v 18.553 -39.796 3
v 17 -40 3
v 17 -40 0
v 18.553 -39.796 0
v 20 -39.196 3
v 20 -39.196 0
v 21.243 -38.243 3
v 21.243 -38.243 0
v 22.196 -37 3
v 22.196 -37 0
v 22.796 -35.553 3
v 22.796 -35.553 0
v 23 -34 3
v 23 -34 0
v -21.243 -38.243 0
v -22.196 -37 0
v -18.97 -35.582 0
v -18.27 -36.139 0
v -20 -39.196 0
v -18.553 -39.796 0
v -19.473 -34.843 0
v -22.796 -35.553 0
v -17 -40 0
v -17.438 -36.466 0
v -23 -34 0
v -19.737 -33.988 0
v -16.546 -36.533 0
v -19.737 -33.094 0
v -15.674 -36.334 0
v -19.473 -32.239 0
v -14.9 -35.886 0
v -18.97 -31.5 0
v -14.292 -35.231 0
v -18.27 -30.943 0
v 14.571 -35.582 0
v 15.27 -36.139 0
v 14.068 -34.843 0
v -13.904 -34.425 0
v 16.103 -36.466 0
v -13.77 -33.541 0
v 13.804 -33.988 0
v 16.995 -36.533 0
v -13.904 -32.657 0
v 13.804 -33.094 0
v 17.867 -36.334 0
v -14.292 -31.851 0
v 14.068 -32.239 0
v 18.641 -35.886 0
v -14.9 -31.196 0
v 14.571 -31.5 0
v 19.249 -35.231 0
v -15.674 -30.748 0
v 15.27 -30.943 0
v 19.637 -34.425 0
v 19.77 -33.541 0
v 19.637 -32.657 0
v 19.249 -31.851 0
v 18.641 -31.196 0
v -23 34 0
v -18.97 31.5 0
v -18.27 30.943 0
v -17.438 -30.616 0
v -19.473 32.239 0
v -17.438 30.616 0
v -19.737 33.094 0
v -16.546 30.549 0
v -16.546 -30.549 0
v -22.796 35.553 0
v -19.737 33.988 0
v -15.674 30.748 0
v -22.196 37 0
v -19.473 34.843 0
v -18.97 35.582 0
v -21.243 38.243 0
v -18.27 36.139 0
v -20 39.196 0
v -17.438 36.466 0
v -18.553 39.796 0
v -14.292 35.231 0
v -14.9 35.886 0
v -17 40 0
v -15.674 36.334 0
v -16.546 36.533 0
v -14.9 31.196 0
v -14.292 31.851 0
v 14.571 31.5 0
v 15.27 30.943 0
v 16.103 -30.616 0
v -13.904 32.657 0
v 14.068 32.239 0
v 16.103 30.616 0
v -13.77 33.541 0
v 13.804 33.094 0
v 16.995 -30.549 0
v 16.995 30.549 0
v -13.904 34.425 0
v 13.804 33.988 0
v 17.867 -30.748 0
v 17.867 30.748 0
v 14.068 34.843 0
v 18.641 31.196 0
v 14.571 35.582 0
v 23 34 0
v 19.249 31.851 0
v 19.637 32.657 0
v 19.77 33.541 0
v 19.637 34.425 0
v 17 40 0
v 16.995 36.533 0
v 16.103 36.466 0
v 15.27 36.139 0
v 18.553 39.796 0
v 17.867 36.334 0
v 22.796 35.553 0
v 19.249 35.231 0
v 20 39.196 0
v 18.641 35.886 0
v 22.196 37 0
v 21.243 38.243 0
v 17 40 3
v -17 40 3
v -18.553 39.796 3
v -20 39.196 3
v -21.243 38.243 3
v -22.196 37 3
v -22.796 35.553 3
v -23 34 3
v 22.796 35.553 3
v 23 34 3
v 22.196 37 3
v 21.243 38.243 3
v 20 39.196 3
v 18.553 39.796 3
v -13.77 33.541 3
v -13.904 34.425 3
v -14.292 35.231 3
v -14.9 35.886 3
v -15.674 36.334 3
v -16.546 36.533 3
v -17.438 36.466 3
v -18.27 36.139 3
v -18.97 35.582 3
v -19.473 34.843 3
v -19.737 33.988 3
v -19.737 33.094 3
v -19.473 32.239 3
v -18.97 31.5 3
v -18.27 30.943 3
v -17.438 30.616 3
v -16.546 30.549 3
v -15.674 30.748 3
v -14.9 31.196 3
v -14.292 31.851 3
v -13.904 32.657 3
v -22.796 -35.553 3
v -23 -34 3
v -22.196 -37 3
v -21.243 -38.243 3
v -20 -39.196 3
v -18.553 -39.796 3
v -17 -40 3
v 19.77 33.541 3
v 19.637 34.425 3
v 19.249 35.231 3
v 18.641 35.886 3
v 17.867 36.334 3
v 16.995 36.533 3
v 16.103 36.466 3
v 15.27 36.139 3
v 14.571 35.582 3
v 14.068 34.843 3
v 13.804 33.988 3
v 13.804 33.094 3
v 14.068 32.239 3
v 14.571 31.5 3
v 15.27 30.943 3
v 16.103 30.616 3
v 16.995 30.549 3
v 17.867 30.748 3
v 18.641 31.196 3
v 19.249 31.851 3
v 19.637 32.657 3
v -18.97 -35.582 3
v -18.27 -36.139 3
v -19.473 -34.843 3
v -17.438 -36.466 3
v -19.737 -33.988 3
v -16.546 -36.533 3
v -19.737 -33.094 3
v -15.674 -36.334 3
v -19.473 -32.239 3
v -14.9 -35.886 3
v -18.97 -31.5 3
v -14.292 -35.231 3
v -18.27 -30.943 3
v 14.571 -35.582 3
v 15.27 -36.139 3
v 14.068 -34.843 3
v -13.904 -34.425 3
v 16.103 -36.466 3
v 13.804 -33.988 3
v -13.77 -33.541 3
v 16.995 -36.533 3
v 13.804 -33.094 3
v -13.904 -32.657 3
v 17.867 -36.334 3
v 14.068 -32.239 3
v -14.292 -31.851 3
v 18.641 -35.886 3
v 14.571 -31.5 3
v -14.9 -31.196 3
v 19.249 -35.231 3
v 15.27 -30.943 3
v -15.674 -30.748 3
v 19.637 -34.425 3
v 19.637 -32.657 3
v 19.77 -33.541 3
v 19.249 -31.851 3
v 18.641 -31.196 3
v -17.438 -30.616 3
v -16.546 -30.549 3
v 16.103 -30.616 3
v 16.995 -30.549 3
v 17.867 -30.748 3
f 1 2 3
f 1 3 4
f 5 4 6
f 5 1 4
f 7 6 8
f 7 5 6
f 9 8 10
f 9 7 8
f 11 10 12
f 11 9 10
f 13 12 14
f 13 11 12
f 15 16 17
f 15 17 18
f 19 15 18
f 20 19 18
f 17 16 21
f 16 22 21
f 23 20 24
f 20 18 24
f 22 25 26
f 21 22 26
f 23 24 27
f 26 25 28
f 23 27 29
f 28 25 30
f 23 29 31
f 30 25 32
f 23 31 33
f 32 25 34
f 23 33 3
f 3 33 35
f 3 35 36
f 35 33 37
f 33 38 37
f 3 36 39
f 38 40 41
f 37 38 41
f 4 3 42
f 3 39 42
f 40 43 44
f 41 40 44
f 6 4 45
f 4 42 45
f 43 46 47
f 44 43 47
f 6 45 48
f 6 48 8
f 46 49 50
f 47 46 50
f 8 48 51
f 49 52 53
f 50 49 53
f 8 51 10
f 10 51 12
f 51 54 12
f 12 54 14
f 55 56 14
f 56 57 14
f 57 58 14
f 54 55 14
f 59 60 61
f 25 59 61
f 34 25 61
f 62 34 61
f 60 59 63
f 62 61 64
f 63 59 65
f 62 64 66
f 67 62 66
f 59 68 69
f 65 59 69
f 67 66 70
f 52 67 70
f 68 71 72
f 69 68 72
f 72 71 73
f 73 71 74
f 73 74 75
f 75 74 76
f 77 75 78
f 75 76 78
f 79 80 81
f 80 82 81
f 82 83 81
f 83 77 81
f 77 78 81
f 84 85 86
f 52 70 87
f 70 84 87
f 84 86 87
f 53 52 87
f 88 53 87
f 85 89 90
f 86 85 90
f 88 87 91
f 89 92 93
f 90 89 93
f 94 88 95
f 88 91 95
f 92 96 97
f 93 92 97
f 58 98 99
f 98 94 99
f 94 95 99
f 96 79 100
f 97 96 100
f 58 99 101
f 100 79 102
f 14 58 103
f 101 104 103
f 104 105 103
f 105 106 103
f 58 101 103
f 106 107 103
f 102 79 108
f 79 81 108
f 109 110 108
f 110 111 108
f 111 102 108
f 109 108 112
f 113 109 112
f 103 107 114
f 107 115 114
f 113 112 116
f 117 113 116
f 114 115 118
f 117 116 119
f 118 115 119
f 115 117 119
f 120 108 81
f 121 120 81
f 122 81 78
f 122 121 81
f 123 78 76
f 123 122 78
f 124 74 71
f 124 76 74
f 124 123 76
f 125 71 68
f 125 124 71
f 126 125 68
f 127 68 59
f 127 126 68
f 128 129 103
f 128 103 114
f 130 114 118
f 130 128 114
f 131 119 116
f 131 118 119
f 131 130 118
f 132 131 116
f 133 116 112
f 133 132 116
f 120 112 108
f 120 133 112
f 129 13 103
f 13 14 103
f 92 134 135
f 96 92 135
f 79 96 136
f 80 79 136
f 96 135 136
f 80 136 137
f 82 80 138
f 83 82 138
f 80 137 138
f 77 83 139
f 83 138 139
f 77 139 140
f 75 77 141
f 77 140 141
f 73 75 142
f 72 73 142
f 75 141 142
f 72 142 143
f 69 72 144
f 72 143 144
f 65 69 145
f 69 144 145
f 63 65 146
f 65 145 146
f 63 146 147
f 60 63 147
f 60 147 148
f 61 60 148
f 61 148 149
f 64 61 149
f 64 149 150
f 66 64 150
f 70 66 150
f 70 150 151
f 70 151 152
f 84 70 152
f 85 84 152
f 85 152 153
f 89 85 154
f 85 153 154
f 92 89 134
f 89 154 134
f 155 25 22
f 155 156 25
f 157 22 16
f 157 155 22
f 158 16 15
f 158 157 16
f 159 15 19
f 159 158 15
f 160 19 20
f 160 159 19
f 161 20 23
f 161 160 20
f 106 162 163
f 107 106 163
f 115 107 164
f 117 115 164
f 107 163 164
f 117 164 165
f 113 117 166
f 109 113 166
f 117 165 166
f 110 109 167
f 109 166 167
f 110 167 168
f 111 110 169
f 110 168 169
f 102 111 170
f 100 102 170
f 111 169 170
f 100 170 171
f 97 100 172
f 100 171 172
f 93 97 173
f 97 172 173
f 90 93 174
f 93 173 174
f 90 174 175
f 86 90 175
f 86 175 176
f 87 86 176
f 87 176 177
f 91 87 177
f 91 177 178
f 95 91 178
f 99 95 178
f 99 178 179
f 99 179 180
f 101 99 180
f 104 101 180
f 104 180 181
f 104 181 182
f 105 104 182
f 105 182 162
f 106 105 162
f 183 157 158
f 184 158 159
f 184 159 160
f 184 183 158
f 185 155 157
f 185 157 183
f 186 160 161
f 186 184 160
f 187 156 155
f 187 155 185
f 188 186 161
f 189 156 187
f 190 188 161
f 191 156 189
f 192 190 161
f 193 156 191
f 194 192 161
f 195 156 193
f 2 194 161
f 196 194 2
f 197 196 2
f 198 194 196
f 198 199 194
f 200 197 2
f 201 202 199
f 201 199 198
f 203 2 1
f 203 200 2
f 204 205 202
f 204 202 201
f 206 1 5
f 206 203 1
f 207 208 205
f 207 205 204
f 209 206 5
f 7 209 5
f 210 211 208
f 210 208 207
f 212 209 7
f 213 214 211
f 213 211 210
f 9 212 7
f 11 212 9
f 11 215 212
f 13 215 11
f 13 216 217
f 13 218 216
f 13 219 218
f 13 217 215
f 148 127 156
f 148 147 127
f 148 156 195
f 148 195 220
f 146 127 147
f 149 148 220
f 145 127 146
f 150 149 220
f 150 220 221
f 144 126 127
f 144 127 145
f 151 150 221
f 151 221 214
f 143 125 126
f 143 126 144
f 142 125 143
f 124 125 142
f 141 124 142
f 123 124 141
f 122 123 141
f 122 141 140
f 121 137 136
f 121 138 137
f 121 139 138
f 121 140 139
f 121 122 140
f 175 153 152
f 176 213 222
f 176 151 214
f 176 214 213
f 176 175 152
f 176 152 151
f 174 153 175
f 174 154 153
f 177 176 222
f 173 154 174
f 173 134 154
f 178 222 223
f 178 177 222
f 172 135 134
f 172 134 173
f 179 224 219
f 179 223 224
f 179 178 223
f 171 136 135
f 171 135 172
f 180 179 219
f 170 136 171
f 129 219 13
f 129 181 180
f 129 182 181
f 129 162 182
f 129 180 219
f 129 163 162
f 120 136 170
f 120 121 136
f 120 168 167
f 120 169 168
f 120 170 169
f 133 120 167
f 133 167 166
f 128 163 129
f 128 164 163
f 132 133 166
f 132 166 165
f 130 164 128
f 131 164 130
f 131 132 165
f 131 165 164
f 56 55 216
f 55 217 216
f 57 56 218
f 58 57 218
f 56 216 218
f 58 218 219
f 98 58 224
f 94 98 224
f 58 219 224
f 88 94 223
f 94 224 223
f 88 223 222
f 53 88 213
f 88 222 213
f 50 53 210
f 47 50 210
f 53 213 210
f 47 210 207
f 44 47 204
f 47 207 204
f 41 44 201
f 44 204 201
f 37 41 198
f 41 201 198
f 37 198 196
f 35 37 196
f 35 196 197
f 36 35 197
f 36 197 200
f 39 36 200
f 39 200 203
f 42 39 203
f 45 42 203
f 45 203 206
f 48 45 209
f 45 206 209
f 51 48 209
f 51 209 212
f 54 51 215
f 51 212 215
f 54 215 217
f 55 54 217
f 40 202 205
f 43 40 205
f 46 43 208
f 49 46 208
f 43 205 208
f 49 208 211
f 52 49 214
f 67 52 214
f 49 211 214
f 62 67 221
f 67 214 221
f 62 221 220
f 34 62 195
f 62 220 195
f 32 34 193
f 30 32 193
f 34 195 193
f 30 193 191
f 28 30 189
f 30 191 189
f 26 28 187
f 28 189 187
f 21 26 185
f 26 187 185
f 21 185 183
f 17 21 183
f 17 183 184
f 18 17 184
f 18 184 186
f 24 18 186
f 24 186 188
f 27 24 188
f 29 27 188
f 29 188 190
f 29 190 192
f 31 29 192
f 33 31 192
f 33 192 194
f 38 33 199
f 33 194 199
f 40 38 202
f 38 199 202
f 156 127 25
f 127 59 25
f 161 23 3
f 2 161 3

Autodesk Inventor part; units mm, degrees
ref_plane "YZ Plane" through (0, 0, 0) normal (1, 0, 0) x (0, 1, 0)
ref_plane "XZ Plane" through (0, 0, 0) normal (0, 1, 0) x (-1, 0, 0)
ref_plane "XY Plane" through (0, 0, 0) normal (0, 0, 1) x (1, 0, 0)
sketch "Sketch1" plane through (0, 0, 0) normal (0, 0, 1) x (1, 0, 0)
  line L0 (-23, -40) -> (23, -40)
  line L1 (23, -40) -> (23, 40)
  line L2 (23, 40) -> (-23, 40)
  line L3 (-23, 40) -> (-23, -40)
  line L4 (-23, -40) -> (23, 40) construction
  line L5 (23, -40) -> (-23, 40) construction
  line L6 (10, -20) -> (-10, -20)
  line L7 (-10, -20) -> (-10, 20)
  line L8 (-10, 20) -> (10, 20)
  line L9 (10, 20) -> (10, -20)
  line L10 (10, -20) -> (-10, 20) construction
  line L11 (-10, -20) -> (10, 20) construction
  point P0 (0, 0)
  dimension "d154" = 46
  dimension "d155" = 80
  dimension "d172" = 20
  dimension "d181" = 40
extrude "Plate5" add sketch "Sketch1" along normal blind 3 contours L3 L2 L1 L0 | L6 L7 L8 L9
sketch "Sketch9" plane through (0, 0, 3) normal (0, 0, 1) x (1, 0, 0)
  circle A0 centre (16.7705, -33.541) radius 3
  line L0 (16.7705, 33.541) -> (-16.7705, 33.541) construction
  line L1 (-16.7705, 33.541) -> (-16.7705, -33.541) construction
  line L2 (-16.7705, -33.541) -> (16.7705, -33.541) construction
  line L3 (16.7705, -33.541) -> (16.7705, 33.541) construction
  line L4 (16.7705, 33.541) -> (-16.7705, -33.541) construction
  line L5 (-16.7705, 33.541) -> (16.7705, -33.541) construction
  circle A1 centre (-16.7705, -33.541) radius 3
  circle A2 centre (16.7705, 33.541) radius 3
  circle A3 centre (-16.7705, 33.541) radius 3
  circle A4 centre (0, 0) radius 37.5 construction
  line L6 (23, -40) -> (-23, -40) construction
  line L7 (23, 40) -> (23, -40) construction
  line L8 (-23, 40) -> (23, 40) construction
  line L9 (-23, -40) -> (-23, 40) construction
  circle A5 centre (0, 0) radius 22.3607 construction
  line L10 (10, 20) -> (-10, -20) construction
  dimension "d180" = 75
  dimension "d182" = 15.1393
  dimension "d174" = 6
  dimension "d183" = 33.541
extrude "Cut2" cut sketch "Sketch9" against normal blind 3
fillet "Corner Round1" radius 6 4 edges at (23, 40, 1.5) (-23, 40, 1.5) (-23, -40, 1.5) (23, -40, 1.5)
feature "Corner Round2" [suppressed]
properties part number "ANP 1434 BOTTOM FDS support flange" material "Stainless Steel"
